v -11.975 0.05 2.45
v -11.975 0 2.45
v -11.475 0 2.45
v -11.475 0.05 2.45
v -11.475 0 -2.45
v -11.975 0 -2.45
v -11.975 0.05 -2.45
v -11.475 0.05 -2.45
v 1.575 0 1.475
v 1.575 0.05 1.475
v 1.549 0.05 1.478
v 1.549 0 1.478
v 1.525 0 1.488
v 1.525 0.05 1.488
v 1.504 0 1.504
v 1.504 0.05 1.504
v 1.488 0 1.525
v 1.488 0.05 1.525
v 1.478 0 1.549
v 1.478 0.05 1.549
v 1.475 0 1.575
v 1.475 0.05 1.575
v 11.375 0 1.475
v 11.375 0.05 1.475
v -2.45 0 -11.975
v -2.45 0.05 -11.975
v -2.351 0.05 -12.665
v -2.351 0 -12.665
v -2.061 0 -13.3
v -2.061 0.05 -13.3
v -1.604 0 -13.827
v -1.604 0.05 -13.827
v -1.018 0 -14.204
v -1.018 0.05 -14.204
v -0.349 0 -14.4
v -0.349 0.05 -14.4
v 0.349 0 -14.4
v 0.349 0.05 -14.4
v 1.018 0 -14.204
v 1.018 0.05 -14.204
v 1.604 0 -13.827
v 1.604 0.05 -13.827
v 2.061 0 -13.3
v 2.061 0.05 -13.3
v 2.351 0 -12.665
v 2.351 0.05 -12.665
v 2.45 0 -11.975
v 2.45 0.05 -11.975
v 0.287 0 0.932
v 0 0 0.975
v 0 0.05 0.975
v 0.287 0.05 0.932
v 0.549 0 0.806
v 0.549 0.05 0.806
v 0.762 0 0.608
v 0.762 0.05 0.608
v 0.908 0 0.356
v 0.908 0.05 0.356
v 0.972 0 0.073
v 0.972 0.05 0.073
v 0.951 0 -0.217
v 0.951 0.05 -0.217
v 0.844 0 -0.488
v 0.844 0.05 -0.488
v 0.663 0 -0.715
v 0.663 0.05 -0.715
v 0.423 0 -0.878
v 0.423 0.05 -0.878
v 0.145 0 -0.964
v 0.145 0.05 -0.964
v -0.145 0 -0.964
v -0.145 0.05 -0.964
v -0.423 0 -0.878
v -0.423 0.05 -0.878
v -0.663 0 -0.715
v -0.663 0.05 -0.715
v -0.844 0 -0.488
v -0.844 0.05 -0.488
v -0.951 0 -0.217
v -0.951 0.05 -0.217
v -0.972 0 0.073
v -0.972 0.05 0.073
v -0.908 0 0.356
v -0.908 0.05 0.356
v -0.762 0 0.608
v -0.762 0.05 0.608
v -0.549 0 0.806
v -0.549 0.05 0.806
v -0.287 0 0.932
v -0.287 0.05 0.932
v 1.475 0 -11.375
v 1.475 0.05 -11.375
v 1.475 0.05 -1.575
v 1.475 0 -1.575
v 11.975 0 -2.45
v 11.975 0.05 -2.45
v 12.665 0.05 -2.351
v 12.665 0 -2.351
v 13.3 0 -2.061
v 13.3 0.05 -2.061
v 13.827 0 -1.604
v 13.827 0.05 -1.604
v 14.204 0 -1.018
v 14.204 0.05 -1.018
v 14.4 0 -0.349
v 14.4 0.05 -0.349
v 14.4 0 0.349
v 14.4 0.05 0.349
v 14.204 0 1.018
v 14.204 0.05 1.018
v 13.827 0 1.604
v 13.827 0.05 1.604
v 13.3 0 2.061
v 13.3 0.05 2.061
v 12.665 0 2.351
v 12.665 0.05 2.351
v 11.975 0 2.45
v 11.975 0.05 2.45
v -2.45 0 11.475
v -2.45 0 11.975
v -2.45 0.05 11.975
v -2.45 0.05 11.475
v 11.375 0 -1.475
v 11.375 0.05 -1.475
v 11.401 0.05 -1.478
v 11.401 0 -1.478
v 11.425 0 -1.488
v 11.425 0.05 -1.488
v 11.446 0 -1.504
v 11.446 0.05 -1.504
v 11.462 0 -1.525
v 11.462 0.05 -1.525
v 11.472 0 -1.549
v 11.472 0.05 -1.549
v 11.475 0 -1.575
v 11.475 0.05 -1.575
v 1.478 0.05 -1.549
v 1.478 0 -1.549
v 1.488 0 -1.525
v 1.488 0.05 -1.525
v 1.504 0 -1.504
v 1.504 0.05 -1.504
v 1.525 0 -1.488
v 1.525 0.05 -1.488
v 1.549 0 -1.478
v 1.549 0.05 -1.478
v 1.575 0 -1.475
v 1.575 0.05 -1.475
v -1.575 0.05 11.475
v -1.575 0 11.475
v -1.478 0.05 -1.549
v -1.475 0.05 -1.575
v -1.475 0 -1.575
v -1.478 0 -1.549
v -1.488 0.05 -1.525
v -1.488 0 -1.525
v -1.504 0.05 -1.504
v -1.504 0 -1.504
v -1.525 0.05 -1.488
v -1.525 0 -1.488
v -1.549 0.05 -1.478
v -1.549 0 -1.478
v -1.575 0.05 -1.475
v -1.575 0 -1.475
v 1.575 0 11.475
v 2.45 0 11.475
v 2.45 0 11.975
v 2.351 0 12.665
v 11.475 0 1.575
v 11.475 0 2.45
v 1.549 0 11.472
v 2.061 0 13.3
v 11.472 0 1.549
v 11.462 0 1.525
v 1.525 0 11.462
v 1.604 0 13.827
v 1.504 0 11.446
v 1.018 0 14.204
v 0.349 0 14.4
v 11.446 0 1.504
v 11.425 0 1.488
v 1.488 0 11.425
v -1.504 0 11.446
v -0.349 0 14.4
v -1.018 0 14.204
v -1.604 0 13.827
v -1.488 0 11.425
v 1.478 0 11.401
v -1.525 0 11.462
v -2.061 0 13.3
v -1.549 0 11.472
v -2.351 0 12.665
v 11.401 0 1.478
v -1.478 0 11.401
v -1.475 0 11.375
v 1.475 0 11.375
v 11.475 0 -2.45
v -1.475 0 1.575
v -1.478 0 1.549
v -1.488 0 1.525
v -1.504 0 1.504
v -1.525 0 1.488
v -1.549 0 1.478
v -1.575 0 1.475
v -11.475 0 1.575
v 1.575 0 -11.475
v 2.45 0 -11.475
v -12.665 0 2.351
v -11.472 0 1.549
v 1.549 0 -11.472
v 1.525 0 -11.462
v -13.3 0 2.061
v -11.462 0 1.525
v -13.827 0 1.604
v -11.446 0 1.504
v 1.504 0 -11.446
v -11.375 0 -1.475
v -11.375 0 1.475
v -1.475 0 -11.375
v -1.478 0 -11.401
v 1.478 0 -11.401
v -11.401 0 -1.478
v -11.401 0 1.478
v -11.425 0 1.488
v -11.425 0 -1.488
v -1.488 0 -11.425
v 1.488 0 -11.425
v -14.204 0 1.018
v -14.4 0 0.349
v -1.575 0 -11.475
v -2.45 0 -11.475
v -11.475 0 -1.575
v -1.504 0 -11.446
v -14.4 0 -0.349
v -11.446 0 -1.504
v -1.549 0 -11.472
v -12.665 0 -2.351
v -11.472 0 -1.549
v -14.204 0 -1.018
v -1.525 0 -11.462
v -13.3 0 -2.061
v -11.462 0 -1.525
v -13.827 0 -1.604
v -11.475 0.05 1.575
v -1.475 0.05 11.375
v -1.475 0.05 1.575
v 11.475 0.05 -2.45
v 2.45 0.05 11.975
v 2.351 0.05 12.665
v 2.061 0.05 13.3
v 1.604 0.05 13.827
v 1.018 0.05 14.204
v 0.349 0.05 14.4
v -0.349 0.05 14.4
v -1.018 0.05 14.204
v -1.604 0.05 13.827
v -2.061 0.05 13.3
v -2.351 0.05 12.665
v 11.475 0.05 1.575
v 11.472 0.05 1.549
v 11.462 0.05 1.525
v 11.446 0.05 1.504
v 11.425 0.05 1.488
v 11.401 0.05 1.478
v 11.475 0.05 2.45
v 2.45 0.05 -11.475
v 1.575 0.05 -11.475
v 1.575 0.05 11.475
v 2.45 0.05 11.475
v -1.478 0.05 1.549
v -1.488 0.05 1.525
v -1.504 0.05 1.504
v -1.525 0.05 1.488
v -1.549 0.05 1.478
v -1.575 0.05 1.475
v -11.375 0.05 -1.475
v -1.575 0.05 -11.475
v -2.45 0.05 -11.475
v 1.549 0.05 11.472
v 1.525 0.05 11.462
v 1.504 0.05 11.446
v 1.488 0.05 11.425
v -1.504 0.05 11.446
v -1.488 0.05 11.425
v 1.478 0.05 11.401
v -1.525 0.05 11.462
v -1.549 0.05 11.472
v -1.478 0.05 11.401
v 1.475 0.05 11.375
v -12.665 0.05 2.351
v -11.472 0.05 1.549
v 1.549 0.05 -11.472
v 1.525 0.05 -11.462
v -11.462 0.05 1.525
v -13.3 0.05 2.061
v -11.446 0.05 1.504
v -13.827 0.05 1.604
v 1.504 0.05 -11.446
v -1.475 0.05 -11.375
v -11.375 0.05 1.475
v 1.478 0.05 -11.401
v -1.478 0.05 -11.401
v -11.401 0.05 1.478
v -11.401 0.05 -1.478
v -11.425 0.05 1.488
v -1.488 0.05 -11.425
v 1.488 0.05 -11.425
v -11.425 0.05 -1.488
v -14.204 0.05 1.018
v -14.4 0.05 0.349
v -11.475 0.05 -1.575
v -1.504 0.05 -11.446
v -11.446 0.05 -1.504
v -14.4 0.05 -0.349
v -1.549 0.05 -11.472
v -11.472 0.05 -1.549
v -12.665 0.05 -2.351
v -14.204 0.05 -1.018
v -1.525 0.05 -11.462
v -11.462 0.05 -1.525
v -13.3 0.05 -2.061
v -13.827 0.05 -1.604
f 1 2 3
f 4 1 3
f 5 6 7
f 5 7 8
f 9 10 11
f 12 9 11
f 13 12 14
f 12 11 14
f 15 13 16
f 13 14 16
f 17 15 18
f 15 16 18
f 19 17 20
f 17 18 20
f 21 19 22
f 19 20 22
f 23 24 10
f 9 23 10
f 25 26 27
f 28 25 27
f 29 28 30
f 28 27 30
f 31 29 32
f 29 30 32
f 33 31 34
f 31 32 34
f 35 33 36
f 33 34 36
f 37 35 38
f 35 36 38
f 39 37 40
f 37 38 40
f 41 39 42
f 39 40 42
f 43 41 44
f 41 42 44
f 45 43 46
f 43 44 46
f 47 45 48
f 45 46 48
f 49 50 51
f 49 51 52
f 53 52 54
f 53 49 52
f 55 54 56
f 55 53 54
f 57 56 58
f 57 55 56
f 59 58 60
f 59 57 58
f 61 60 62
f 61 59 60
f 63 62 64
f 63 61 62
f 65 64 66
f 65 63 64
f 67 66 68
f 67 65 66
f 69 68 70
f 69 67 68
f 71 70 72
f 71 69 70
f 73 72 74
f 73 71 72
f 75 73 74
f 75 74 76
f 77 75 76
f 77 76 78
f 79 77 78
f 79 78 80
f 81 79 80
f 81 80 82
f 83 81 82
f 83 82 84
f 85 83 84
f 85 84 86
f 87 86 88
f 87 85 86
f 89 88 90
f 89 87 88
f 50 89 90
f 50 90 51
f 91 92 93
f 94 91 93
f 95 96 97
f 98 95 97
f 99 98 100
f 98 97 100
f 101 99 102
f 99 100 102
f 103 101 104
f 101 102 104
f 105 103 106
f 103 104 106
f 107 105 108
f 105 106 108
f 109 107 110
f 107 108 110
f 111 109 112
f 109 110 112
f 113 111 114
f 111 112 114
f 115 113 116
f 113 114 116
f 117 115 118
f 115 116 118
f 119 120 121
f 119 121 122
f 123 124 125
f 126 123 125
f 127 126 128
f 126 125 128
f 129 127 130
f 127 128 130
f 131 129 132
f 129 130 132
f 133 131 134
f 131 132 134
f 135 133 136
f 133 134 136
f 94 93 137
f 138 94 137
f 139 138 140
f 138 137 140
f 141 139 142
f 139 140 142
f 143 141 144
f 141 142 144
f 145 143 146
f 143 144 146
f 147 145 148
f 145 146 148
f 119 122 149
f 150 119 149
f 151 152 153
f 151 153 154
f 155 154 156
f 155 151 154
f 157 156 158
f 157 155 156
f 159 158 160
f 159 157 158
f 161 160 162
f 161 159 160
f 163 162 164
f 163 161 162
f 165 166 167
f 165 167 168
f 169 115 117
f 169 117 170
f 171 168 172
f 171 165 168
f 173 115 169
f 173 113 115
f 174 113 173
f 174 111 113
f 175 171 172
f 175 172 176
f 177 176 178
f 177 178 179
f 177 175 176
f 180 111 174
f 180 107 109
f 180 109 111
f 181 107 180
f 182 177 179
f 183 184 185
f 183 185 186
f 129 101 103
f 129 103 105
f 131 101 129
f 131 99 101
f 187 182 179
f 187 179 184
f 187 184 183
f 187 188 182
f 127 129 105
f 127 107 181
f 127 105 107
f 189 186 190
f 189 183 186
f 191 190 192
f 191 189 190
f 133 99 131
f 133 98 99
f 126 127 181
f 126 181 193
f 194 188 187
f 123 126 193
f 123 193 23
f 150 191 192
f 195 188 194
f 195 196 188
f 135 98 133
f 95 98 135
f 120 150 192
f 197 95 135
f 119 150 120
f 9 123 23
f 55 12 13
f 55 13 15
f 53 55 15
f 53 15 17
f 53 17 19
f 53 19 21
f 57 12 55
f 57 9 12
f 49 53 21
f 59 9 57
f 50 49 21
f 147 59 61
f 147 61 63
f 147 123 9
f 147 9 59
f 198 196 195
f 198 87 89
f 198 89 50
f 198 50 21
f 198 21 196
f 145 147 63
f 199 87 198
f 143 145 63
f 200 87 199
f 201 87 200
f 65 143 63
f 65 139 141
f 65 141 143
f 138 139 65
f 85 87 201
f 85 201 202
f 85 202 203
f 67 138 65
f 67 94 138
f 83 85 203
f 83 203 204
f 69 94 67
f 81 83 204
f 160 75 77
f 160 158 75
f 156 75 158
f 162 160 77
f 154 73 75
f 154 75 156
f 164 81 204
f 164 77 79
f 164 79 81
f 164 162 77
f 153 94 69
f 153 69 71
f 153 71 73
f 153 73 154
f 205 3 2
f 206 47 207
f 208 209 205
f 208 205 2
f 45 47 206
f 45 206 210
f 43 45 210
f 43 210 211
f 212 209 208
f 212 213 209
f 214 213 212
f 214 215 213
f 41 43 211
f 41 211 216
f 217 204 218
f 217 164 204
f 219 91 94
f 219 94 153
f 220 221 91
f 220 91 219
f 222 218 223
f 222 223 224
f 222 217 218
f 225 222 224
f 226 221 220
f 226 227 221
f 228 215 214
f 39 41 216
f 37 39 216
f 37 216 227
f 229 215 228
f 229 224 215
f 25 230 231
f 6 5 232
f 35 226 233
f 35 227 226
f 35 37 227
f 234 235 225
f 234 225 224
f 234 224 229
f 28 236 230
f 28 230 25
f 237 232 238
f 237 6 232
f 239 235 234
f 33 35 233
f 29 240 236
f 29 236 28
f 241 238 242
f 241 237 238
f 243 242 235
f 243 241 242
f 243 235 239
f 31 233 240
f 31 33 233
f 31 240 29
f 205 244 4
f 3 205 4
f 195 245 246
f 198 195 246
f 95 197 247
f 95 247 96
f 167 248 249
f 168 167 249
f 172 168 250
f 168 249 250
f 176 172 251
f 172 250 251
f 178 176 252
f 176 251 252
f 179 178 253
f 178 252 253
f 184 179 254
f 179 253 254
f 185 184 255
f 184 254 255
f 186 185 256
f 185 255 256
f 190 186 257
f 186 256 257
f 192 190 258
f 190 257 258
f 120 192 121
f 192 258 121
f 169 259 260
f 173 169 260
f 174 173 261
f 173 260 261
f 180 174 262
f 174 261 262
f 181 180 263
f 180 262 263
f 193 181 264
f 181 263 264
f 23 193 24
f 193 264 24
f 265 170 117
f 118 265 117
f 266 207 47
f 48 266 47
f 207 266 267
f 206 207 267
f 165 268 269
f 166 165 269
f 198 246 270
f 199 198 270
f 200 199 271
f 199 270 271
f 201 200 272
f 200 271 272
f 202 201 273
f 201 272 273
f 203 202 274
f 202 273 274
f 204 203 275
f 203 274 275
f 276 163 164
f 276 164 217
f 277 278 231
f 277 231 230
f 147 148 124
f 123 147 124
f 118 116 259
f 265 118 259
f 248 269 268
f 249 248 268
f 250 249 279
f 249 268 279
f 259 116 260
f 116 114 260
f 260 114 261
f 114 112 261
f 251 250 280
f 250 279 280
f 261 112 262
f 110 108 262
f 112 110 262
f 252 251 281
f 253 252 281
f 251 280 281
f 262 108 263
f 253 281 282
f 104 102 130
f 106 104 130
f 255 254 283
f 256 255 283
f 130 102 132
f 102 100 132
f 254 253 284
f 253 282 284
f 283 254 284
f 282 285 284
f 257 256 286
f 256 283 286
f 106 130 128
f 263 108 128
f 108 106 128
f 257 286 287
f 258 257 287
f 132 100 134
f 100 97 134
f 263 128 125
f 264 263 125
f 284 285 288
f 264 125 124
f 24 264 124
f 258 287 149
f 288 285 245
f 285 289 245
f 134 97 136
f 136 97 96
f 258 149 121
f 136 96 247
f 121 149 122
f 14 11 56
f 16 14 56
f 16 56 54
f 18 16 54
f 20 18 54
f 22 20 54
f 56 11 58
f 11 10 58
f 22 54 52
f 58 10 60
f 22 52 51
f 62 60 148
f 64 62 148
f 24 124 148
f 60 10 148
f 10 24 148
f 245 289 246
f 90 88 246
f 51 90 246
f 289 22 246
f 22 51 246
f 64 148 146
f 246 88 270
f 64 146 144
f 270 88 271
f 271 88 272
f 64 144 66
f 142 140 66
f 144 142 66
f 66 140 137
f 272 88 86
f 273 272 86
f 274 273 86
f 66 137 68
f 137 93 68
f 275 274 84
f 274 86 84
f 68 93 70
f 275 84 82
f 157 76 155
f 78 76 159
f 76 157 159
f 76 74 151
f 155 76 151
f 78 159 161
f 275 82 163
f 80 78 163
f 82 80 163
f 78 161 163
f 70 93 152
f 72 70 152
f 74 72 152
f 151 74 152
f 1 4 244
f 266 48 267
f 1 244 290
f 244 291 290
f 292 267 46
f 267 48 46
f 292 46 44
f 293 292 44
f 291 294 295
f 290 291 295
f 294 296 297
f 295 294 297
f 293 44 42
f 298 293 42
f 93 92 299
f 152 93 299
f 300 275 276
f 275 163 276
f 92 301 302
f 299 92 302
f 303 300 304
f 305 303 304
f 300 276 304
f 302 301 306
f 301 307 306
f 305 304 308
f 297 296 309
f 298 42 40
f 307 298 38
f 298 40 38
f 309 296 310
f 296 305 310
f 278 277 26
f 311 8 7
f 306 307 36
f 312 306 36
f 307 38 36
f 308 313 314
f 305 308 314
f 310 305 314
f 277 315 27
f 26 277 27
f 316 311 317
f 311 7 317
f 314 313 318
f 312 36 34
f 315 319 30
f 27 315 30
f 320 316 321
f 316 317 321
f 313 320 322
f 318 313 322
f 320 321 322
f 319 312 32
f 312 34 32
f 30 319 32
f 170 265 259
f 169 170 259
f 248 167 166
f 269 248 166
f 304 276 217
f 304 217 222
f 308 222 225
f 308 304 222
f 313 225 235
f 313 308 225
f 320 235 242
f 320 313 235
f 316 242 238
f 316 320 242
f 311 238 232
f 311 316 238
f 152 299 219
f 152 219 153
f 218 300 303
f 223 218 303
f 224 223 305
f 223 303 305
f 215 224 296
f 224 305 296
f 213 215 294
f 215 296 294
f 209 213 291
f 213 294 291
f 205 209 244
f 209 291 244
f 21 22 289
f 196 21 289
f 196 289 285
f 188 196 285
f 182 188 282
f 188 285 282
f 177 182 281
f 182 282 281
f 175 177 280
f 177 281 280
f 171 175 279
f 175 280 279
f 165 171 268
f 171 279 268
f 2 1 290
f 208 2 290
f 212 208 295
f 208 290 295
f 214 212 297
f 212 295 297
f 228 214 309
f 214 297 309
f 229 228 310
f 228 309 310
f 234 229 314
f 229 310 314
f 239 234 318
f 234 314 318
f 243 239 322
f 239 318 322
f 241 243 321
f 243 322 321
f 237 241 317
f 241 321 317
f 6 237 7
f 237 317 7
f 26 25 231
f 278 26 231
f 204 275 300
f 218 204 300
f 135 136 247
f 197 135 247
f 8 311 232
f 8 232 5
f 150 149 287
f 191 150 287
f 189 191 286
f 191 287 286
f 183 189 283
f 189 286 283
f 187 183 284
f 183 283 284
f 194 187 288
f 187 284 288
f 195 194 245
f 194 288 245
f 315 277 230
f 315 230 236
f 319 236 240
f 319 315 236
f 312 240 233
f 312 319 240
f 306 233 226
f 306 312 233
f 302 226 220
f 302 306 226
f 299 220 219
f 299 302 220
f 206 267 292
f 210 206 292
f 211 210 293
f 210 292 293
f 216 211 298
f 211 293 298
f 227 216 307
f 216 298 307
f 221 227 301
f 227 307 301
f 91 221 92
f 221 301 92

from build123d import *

# Parameters (mm, degrees)
SKETCH1_W           = 22.95
SKETCH1_H           = 22.95
SKETCH1_W_2         = 22.45
SKETCH1_H_2         = 22.45
SKETCH1_W_3         = 0.25
SKETCH1_H_3         = 9.5
SKETCH1_W_4         = 9.5
SKETCH1_H_4         = 0.25
SKETCH1_R           = 0.975
SKETCH1_H_5         = 1
SKETCH1_W_5         = 1
BOSS_EXTRUDE5_DEPTH = 0.05
CUT_EXTRUDE1_DEPTH  = 17.93528122
SKETCH4_W           = 0.75
SKETCH4_H           = 2.95
SKETCH4_W_2         = 9.5
SKETCH4_W_3         = 2.95
SKETCH4_H_2         = 9.5
SKETCH4_H_3         = 0.75
BOSS_EXTRUDE9_DEPTH = 0.05


with BuildPart() as part:
    # Sketch1 → Boss-Extrude5 (new body)
    # profile 1 of 26: a face of its own
    with BuildSketch(Plane(origin=(0, 0, 0), x_dir=(1, 0, 0), z_dir=(0, 1, 0))):
        Rectangle(SKETCH1_W, SKETCH1_H)
        Rectangle(SKETCH1_W_2, SKETCH1_H_2, mode=Mode.SUBTRACT)
    # profile 2 of 26: a face of its own
    with BuildSketch(Plane(origin=(0, 0, 0), x_dir=(1, 0, 0), z_dir=(0, 1, 0))):
        with Locations((-1.6, -6.475)):
            Rectangle(SKETCH1_W_3, SKETCH1_H_3)
    # profile 3 of 26: a face of its own
    with BuildSketch(Plane(origin=(0, 0, 0), x_dir=(1, 0, 0), z_dir=(0, 1, 0))):
        with Locations((-6.475, -1.6)):
            Rectangle(SKETCH1_W_4, SKETCH1_H_4)
    # profile 4 of 26: a face of its own
    with BuildSketch(Plane(origin=(0, 0, 0), x_dir=(1, 0, 0), z_dir=(0, 1, 0))):
        Polygon((-1.475, -1.475), (-1.475, -1.725), (1.475, -1.725), (1.475, -1.475), (1.725, -1.475), (1.725, 1.475), (1.475, 1.475), (1.475, 1.725), (-1.475, 1.725), (-1.475, 1.475), (-1.725, 1.475), (-1.725, -1.475), align=None)
        with Locations(Location((0, 0, 0), (0, 0, 270))):
            Circle(SKETCH1_R, mode=Mode.SUBTRACT)
    # profile 5 of 26: a face of its own
    with BuildSketch(Plane(origin=(0, 0, 0), x_dir=(1, 0, 0), z_dir=(0, 1, 0))):
        with Locations((-1.6, -1.6)):
            Rectangle(SKETCH1_W_3, SKETCH1_H_4)
    # profile 6 of 26: a face of its own
    with BuildSketch(Plane(origin=(0, 0, 0), x_dir=(1, 0, 0), z_dir=(0, 1, 0))):
        with Locations((1.6, -1.6)):
            Rectangle(SKETCH1_W_3, SKETCH1_H_4)
    # profile 7 of 26: a face of its own
    with BuildSketch(Plane(origin=(0, 0, 0), x_dir=(1, 0, 0), z_dir=(0, 1, 0))):
        with Locations((6.475, -1.6)):
            Rectangle(SKETCH1_W_4, SKETCH1_H_4)
    # profile 8 of 26: a face of its own
    with BuildSketch(Plane(origin=(0, 0, 0), x_dir=(1, 0, 0), z_dir=(0, 1, 0))):
        with Locations((1.6, -6.475)):
            Rectangle(SKETCH1_W_3, SKETCH1_H_3)
    # profile 9 of 26: a face of its own
    with BuildSketch(Plane(origin=(0, 0, 0), x_dir=(1, 0, 0), z_dir=(0, 1, 0))):
        with Locations((1.6, 1.6)):
            Rectangle(SKETCH1_W_3, SKETCH1_H_4)
    # profile 10 of 26: a face of its own
    with BuildSketch(Plane(origin=(0, 0, 0), x_dir=(1, 0, 0), z_dir=(0, 1, 0))):
        with Locations((6.475, 1.6)):
            Rectangle(SKETCH1_W_4, SKETCH1_H_4)
    # profile 11 of 26: a face of its own
    with BuildSketch(Plane(origin=(0, 0, 0), x_dir=(1, 0, 0), z_dir=(0, 1, 0))):
        with Locations((1.6, 6.475)):
            Rectangle(SKETCH1_W_3, SKETCH1_H_3)
    # profile 12 of 26: a face of its own
    with BuildSketch(Plane(origin=(0, 0, 0), x_dir=(1, 0, 0), z_dir=(0, 1, 0))):
        with Locations((-1.6, 1.6)):
            Rectangle(SKETCH1_W_3, SKETCH1_H_4)
    # profile 13 of 26: a face of its own
    with BuildSketch(Plane(origin=(0, 0, 0), x_dir=(1, 0, 0), z_dir=(0, 1, 0))):
        with Locations((-6.475, 1.6)):
            Rectangle(SKETCH1_W_4, SKETCH1_H_4)
    # profile 14 of 26: a face of its own
    with BuildSketch(Plane(origin=(0, 0, 0), x_dir=(1, 0, 0), z_dir=(0, 1, 0))):
        with Locations((-1.6, 6.475)):
            Rectangle(SKETCH1_W_3, SKETCH1_H_3)
    # profile 15 of 26: a face of its own
    with BuildSketch(Plane(origin=(0, 0, 0), x_dir=(1, 0, 0), z_dir=(0, 1, 0))):
        with Locations((-11.6, -1.95)):
            Rectangle(SKETCH1_W_3, SKETCH1_H_5)
    # profile 16 of 26: a face of its own
    with BuildSketch(Plane(origin=(0, 0, 0), x_dir=(1, 0, 0), z_dir=(0, 1, 0))):
        with Locations((-11.6, 1.95)):
            Rectangle(SKETCH1_W_3, SKETCH1_H_5)
    # profile 17 of 26: a face of its own
    with BuildSketch(Plane(origin=(0, 0, 0), x_dir=(1, 0, 0), z_dir=(0, 1, 0))):
        with Locations((11.6, -1.95)):
            Rectangle(SKETCH1_W_3, SKETCH1_H_5)
    # profile 18 of 26: a face of its own
    with BuildSketch(Plane(origin=(0, 0, 0), x_dir=(1, 0, 0), z_dir=(0, 1, 0))):
        with Locations((11.6, 1.95)):
            Rectangle(SKETCH1_W_3, SKETCH1_H_5)
    # profile 19 of 26: a face of its own
    with BuildSketch(Plane(origin=(0, 0, 0), x_dir=(1, 0, 0), z_dir=(0, 1, 0))):
        with Locations((1.95, -11.6)):
            Rectangle(SKETCH1_W_5, SKETCH1_H_4)
    # profile 20 of 26: a face of its own
    with BuildSketch(Plane(origin=(0, 0, 0), x_dir=(1, 0, 0), z_dir=(0, 1, 0))):
        with Locations((-1.95, -11.6)):
            Rectangle(SKETCH1_W_5, SKETCH1_H_4)
    # profile 21 of 26: a face of its own
    with BuildSketch(Plane(origin=(0, 0, 0), x_dir=(1, 0, 0), z_dir=(0, 1, 0))):
        with Locations((1.95, 11.6)):
            Rectangle(SKETCH1_W_5, SKETCH1_H_4)
    # profile 22 of 26: a face of its own
    with BuildSketch(Plane(origin=(0, 0, 0), x_dir=(1, 0, 0), z_dir=(0, 1, 0))):
        with Locations((-1.95, 11.6)):
            Rectangle(SKETCH1_W_5, SKETCH1_H_4)
    # profile 23 of 26: a face of its own
    with BuildSketch(Plane(origin=(0, 0, 0), x_dir=(1, 0, 0), z_dir=(0, 1, 0))):
        Polygon((-11.975, -2.45), (-11.725, -2.45), (-11.725, -1.45), (-11.725, 1.45), (-11.725, 2.45), (-11.975, 2.45), align=None)
    # profile 24 of 26: a face of its own
    with BuildSketch(Plane(origin=(0, 0, 0), x_dir=(1, 0, 0), z_dir=(0, 1, 0))):
        Polygon((2.45, -11.975), (2.45, -11.725), (1.45, -11.725), (-1.45, -11.725), (-2.45, -11.725), (-2.45, -11.975), align=None)
    # profile 25 of 26: a face of its own
    with BuildSketch(Plane(origin=(0, 0, 0), x_dir=(1, 0, 0), z_dir=(0, 1, 0))):
        Polygon((11.725, -1.45), (11.725, -2.45), (11.975, -2.45), (11.975, 2.45), (11.725, 2.45), (11.725, 1.45), align=None)
    # profile 26 of 26: a face of its own
    with BuildSketch(Plane(origin=(0, 0, 0), x_dir=(1, 0, 0), z_dir=(0, 1, 0))):
        Polygon((1.45, 11.725), (2.45, 11.725), (2.45, 11.975), (-2.45, 11.975), (-2.45, 11.725), (-1.45, 11.725), align=None)
    extrude(amount=BOSS_EXTRUDE5_DEPTH)

    # Sketch2 → Cut-Extrude1 (cut, through all)
    with BuildSketch(Plane(origin=(0, 0.05, 0), x_dir=(1, 0, 0), z_dir=(0, 1, 0))):
        with BuildLine():
            Line((-11.475, 11.475), (-1.575, 11.475))
            ThreePointArc((-1.575, 11.475), (-1.504289322, 11.445710678), (-1.475, 11.375))
            Line((-1.475, 11.375), (-1.475, 1.575))
            ThreePointArc((-1.475, 1.575), (-1.504289322, 1.504289322), (-1.575, 1.475))
            Line((-1.575, 1.475), (-11.375, 1.475))
            ThreePointArc((-11.375, 1.475), (-11.445710678, 1.504289322), (-11.475, 1.575))
            Line((-11.475, 1.575), (-11.475, 11.475))
        make_face()
        with BuildLine():
            Line((11.475, 11.475), (1.575, 11.475))
            ThreePointArc((1.575, 11.475), (1.504289322, 11.445710678), (1.475, 11.375))
            Line((1.475, 11.375), (1.475, 1.575))
            ThreePointArc((1.475, 1.575), (1.504289322, 1.504289322), (1.575, 1.475))
            Line((1.575, 1.475), (11.375, 1.475))
            ThreePointArc((11.375, 1.475), (11.445710678, 1.504289322), (11.475, 1.575))
            Line((11.475, 1.575), (11.475, 11.475))
        make_face()
        with BuildLine():
            Line((11.475, -11.475), (11.475, -1.575))
            ThreePointArc((11.475, -1.575), (11.445710678, -1.504289322), (11.375, -1.475))
            Line((11.375, -1.475), (1.575, -1.475))
            ThreePointArc((1.575, -1.475), (1.504289322, -1.504289322), (1.475, -1.575))
            Line((1.475, -1.575), (1.475, -11.375))
            ThreePointArc((1.475, -11.375), (1.504289322, -11.445710678), (1.575, -11.475))
            Line((1.575, -11.475), (11.475, -11.475))
        make_face()
        with BuildLine():
            Line((-11.475, -11.475), (-1.575, -11.475))
            ThreePointArc((-1.575, -11.475), (-1.504289322, -11.445710678), (-1.475, -11.375))
            Line((-1.475, -11.375), (-1.475, -1.575))
            ThreePointArc((-1.475, -1.575), (-1.504289322, -1.504289322), (-1.575, -1.475))
            Line((-1.575, -1.475), (-11.375, -1.475))
            ThreePointArc((-11.375, -1.475), (-11.445710678, -1.504289322), (-11.475, -1.575))
            Line((-11.475, -1.575), (-11.475, -11.475))
        make_face()
    extrude(amount=-CUT_EXTRUDE1_DEPTH, mode=Mode.SUBTRACT)


with BuildPart() as cut_extrude1_piece_1:
    # of the separate pieces the step leaves, piece 1, a body of its own (cut_extrude1_pieces)
    add(part.part.solids().sort_by_distance((-1.725, 0, 1.475))[0])



with BuildPart() as cut_extrude1_piece_2:
    # of the separate pieces the step leaves, piece 2, a body of its own (cut_extrude1_pieces)
    add(part.part.solids().sort_by_distance((-1.575, 0, -11.475))[0])


with BuildPart() as cut_extrude1_piece_3:
    # of the separate pieces the step leaves, piece 3, a body of its own (cut_extrude1_pieces)
    add(part.part.solids().sort_by_distance((-11.475, 0, 2.45))[0])


with BuildPart() as cut_extrude1_piece_4:
    # of the separate pieces the step leaves, piece 4, a body of its own (cut_extrude1_pieces)
    add(part.part.solids().sort_by_distance((11.975, 0, 2.45))[0])


with BuildPart() as cut_extrude1_piece_5:
    # of the separate pieces the step leaves, piece 5, a body of its own (cut_extrude1_pieces)
    add(part.part.solids().sort_by_distance((-2.45, 0, 11.975))[0])


with BuildPart() as cut_extrude1_piece_1_1:
    add(cut_extrude1_piece_1.part)

    add(cut_extrude1_piece_2.part)  # Boss-Extrude9 merges Cut-Extrude1 piece 2

    add(cut_extrude1_piece_3.part)  # Boss-Extrude9 merges Cut-Extrude1 piece 3

    add(cut_extrude1_piece_4.part)  # Boss-Extrude9 merges Cut-Extrude1 piece 4

    add(cut_extrude1_piece_5.part)  # Boss-Extrude9 merges Cut-Extrude1 piece 5
    # Sketch4 → Boss-Extrude9 (add)
    with BuildSketch(Plane(origin=(0, 0.05, 0), x_dir=(1, 0, 0), z_dir=(0, 1, 0))):
        with BuildLine():
            Line((-11.975, 2.45), (-11.975, -2.45))
            ThreePointArc((-11.975, -2.45), (-14.425, 0), (-11.975, 2.45))
        make_face()
        with Locations((-11.6, 0)):
            Rectangle(SKETCH4_W, SKETCH4_H)
        with Locations((-6.475, 0)):
            Rectangle(SKETCH4_W_2, SKETCH4_H)
        with Locations((6.475, 0)):
            Rectangle(SKETCH4_W_2, SKETCH4_H)
        with Locations((0, 6.475)):
            Rectangle(SKETCH4_W_3, SKETCH4_H_2)
        with BuildLine():
            Line((11.975, -2.45), (11.975, 2.45))
            ThreePointArc((11.975, 2.45), (14.425, 0), (11.975, -2.45))
        make_face()
        with BuildLine():
            Line((-2.45, -11.975), (2.45, -11.975))
            ThreePointArc((2.45, -11.975), (0, -14.425), (-2.45, -11.975))
        make_face()
        with BuildLine():
            Line((2.45, 11.975), (-2.45, 11.975))
            ThreePointArc((-2.45, 11.975), (0, 14.425), (2.45, 11.975))
        make_face()
        with Locations((0, 11.6)):
            Rectangle(SKETCH4_W_3, SKETCH4_H_3)
        with Locations((11.6, 0)):
            Rectangle(SKETCH4_W, SKETCH4_H)
        with Locations((0, -6.475)):
            Rectangle(SKETCH4_W_3, SKETCH4_H_2)
        with Locations((0, -11.6)):
            Rectangle(SKETCH4_W_3, SKETCH4_H_3)
    extrude(amount=-BOSS_EXTRUDE9_DEPTH)


solid = cut_extrude1_piece_1_1.part
